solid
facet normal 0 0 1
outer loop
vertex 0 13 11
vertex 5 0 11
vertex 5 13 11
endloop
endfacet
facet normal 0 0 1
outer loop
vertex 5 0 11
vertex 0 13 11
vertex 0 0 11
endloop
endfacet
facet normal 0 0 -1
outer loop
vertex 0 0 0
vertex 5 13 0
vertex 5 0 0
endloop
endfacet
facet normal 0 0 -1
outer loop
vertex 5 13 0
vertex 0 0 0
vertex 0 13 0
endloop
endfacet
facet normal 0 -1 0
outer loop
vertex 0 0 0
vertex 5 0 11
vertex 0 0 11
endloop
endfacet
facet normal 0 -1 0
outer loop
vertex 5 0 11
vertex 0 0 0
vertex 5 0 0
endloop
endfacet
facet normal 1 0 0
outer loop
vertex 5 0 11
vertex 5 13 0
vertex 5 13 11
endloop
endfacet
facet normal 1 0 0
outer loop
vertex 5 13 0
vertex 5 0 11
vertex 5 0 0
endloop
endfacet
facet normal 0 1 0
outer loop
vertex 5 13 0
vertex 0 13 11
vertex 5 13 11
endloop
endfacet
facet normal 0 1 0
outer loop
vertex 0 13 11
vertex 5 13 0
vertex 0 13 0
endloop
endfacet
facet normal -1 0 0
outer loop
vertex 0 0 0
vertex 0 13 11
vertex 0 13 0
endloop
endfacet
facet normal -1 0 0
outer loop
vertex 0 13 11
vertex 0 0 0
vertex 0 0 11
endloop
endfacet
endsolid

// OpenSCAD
// Generated by SolidPython 1.0.1 on 2020-07-29 00:46:54


cube(size = [5, 13, 11]);
/***********************************************
*********      SolidPython code:      **********
************************************************
 
# import packages: SolidPython
from solid import *
from solid.utils import *
from itertools import chain, combinations, permutations


class Resize:

    def __init__(self, scad_file):
        self.scad_file = scad_file
        #self.scad_file = import_scad(scad_file)
        # cone/cylinder param:
        self.r1 = 0
        self.r2 = 0
        self.h = 0
        # rectangular prism param:
        self.w = 0
        self.l = 0
        # ellipse param:
        self.r = 0

    # import OpenScad code (file name corresponds to shape)


    # classify shape + parameters
    def assign(self, param1, param2, param3):
        if self.scad_file == 'cone.scad':
            self.r1 = param1
            self.r2 = param2
            self.h = param3
        elif self.scad_file == 'cylinder.scad':
            self.r1 = param1
            self.r2 = param2
            self.h = param3
        elif self.scad_file == 'rectangularPrism.scad':
            self.h = param1
            self.l = param2
            self.w = param3
        else:
            self.r = param1
            self.h = param2

    # resize parameters
    def iterate(self):
        x = range(3, 20, 2)
        i = 1
        if self.scad_file == 'cone.scad':
            tempList = list(permutations(x, 2))
            for temp in tempList:
                param1 = temp[0]
                param2 = temp[1]
                filepath = 'produced_scad_files/' + 'cone' + str(param1) + '_' + str(param2) + '_' + '.scad'
                scad_render_to_file(cylinder(h=param1, r1=param2, r2=0), filepath)

        elif self.scad_file == 'cylinder.scad':
            tempList = list(permutations(x, 3))
            for temp in tempList:
                param1 = temp[0]
                param2 = temp[1]
                filepath = 'produced_scad_files/' + 'cylinder' + str(param1) + '_' + str(param2) + '_' + '.scad'
                scad_render_to_file(cylinder(h=param1, r1=param2, r2=param2), filepath)

        elif self.scad_file == 'rectangularPrism.scad':
            tempList = list(permutations(x, 3))
            for temp in tempList:
                param1 = temp[0]
                param2 = temp[1]
                param3 = temp[2]
                filepath = 'produced_scad_files/' + 'rectangularPrism' + str(param1) + '_' + str(param2) + '_' + str(
                    param3) + '.scad'
                scad_render_to_file(cube(size=(param1, param2, param3)), filepath)

        elif self.scad_file == 'ellipse.scad':
            tempList = list(permutations(x, 4))
            for temp in tempList:
                param1 = temp[0]
                param2 = temp[1]
                param3 = temp[2]
                param4 = temp[3]
                filepath = 'produced_scad_files/' + 'ellipse' + str(param1) + '_' + str(param2) + '_' + str(param3) + '_' + str(param4) + '.scad'
                scad_render_to_file(scale([param1, param2, param3])(sphere(r=param4)), filepath)

    def render_to_scadfile(self):
        scad_render_to_file(scad, 'example.scad') 
 
************************************************/
